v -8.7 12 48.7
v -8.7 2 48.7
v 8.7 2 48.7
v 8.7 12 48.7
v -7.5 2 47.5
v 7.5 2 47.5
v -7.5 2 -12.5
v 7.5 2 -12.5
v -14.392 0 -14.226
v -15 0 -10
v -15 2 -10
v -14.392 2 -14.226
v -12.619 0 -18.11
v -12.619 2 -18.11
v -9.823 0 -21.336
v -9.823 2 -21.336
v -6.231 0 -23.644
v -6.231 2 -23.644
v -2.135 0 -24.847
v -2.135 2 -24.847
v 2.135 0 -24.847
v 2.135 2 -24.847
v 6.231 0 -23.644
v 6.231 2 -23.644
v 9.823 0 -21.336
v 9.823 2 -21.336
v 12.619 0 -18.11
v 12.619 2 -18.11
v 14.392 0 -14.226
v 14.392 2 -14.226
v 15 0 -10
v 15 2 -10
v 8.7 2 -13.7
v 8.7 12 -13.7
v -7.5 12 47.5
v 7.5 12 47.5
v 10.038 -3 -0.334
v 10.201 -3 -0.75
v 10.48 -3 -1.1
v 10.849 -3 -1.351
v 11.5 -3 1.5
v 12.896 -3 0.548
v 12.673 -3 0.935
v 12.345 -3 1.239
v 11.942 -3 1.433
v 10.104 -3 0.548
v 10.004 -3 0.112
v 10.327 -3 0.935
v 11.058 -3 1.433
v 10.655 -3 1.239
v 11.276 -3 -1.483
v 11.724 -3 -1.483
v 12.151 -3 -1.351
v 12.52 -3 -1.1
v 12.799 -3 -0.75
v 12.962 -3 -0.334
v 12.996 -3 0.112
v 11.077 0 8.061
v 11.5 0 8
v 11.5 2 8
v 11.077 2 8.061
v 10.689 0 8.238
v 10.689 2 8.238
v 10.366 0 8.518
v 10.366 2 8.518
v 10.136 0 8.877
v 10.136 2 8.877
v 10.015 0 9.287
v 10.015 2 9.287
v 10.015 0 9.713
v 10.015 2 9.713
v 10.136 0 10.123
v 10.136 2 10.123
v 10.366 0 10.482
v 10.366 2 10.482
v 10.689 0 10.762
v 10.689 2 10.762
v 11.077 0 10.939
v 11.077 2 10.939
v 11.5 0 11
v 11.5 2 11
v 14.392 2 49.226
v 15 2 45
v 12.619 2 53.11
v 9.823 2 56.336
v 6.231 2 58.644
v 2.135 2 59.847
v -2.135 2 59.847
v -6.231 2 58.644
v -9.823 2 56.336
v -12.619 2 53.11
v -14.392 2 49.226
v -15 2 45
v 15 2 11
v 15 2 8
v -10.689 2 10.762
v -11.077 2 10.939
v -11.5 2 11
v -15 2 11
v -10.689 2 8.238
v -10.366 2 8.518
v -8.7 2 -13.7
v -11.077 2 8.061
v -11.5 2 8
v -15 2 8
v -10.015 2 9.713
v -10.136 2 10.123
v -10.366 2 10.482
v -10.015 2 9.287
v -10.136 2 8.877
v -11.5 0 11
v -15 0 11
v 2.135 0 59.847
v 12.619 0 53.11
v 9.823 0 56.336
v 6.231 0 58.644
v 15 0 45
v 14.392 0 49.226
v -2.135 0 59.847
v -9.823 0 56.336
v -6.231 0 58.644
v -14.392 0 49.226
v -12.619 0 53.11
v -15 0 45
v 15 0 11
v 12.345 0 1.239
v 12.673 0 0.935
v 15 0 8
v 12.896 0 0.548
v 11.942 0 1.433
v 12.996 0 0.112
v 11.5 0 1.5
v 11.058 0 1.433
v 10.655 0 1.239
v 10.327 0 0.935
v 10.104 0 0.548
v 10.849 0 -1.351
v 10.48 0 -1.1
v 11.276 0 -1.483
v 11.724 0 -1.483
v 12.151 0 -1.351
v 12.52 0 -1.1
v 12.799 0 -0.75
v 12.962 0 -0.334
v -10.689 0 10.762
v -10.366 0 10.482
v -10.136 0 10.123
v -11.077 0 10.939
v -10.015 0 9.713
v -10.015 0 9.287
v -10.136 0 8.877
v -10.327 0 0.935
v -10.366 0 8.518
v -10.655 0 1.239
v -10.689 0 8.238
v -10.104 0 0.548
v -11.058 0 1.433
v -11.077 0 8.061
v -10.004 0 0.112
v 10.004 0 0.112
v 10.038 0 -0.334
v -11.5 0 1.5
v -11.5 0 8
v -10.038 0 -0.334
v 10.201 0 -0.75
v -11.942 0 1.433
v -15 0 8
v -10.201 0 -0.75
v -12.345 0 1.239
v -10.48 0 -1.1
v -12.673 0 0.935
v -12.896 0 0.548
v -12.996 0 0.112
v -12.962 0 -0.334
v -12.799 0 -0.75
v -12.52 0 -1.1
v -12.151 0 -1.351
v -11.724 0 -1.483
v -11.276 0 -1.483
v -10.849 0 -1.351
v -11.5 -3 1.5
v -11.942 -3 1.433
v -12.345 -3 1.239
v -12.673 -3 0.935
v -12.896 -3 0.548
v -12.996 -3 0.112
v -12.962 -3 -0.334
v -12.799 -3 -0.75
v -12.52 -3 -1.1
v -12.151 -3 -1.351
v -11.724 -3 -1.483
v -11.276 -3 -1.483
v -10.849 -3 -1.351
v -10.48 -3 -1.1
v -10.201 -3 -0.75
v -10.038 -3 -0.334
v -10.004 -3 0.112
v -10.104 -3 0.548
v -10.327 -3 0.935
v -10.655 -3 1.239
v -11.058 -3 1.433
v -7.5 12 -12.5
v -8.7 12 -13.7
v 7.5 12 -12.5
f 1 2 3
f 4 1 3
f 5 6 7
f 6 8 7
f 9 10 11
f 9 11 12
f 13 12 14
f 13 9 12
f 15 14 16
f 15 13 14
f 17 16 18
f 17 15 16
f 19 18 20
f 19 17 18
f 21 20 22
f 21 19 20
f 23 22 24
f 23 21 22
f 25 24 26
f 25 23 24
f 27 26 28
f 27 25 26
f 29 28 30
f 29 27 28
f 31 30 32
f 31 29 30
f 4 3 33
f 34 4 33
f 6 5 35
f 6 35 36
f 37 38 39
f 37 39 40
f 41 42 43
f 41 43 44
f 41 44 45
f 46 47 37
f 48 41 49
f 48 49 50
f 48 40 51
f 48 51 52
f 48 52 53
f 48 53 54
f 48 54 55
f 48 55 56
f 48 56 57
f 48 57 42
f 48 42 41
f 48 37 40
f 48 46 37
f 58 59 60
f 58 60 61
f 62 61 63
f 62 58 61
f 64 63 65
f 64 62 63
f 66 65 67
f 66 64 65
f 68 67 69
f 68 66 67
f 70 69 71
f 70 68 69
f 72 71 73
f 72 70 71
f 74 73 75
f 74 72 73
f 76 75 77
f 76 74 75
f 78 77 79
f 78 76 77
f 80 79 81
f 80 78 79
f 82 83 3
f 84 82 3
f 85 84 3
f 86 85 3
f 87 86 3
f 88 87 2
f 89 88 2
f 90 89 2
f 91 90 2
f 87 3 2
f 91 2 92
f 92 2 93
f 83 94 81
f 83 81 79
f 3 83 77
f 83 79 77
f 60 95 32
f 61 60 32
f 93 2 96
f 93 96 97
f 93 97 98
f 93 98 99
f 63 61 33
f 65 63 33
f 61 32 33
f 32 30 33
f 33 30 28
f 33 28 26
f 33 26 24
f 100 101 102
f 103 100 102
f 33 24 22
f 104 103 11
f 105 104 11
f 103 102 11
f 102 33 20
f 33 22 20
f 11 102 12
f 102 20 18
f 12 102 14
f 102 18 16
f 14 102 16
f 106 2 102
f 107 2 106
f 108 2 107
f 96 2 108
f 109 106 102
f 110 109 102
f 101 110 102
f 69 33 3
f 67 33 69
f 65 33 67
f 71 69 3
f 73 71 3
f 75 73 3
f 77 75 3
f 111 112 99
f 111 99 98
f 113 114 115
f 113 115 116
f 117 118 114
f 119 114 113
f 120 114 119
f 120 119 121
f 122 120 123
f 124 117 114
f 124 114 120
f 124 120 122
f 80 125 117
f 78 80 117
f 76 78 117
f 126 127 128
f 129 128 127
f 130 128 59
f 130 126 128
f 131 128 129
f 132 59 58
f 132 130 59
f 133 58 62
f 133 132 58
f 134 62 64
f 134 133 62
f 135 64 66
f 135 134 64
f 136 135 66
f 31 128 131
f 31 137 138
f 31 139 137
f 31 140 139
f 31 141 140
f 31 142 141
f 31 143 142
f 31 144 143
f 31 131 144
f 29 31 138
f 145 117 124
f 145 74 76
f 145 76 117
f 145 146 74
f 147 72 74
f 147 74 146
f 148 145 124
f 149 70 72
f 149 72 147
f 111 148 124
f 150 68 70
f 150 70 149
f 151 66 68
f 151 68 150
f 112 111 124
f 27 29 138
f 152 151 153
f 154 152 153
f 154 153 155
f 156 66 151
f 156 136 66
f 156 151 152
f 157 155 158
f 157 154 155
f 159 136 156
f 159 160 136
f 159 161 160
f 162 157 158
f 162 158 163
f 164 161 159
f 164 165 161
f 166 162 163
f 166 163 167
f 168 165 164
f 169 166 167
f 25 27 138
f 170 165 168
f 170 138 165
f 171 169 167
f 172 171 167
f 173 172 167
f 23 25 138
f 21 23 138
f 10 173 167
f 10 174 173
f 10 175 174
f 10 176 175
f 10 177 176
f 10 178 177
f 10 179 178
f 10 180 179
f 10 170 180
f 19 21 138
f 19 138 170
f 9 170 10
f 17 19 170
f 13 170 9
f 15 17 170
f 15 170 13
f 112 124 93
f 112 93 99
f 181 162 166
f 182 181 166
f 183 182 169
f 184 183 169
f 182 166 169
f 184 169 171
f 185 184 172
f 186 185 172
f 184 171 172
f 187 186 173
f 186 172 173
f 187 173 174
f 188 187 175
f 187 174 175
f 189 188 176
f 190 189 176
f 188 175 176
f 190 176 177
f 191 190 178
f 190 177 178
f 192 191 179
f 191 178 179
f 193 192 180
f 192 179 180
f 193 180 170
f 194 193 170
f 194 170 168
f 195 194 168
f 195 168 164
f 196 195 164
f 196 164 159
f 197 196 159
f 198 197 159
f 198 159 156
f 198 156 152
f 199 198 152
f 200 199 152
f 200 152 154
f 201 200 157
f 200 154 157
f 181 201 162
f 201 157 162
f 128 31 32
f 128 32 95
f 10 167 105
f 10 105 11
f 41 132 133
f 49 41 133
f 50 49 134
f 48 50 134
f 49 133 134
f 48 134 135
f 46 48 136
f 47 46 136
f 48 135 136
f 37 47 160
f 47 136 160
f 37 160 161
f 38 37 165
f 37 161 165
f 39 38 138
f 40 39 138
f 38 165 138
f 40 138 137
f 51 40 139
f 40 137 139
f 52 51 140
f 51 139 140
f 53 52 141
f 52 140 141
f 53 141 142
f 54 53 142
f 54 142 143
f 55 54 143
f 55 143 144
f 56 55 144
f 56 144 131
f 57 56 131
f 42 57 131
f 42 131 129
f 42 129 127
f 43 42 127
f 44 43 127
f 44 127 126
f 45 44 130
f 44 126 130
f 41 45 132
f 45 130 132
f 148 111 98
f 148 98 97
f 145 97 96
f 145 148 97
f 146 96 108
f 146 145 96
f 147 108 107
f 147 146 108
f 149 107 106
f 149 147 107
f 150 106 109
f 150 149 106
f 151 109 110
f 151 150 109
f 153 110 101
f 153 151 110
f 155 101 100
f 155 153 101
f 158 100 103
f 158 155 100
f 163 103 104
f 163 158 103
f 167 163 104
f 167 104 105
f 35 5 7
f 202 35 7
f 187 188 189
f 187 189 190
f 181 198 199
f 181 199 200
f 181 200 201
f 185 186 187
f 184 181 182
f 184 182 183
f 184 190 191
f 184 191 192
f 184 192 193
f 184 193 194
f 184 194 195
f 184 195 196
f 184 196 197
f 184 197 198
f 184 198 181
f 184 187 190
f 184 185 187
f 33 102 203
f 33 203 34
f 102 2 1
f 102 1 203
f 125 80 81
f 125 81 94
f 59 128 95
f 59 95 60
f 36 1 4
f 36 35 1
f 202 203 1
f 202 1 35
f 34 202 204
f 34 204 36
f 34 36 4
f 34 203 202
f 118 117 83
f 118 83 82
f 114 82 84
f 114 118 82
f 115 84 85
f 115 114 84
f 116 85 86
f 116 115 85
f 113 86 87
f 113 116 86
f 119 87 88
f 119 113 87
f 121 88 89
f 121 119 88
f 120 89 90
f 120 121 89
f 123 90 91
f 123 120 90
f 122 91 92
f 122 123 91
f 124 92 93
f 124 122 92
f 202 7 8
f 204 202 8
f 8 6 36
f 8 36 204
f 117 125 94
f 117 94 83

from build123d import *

# Parameters (mm, degrees)
PLATE_EXTRUDE_DEPTH = 2
PEG_SKETCH_R        = 1.5
PEG_EXTRUDE_DEPTH   = 3
SKETCH3_W           = 17.4
SKETCH3_H           = 62.4
SKETCH3_W_2         = 15
SKETCH3_H_2         = 60
BOSS_EXTRUDE3_DEPTH = 10


with BuildPart() as part:
    # Plate Sketch → Plate Extrude (new body)
    with BuildSketch(Plane(origin=(0, 0, 0), x_dir=(1, 0, 0), z_dir=(0, 1, 0))):
        with BuildLine():
            Line((15, 10), (15, -8))
            Line((15, -8), (11.5, -8))
            ThreePointArc((11.5, -8), (10, -9.5), (11.5, -11))
            Line((11.5, -11), (15, -11))
            Line((15, -11), (15, -45))
            ThreePointArc((15, -45), (0, -60), (-15, -45))
            Line((-15, -45), (-15, -11))
            Line((-15, -11), (-11.5, -11))
            ThreePointArc((-11.5, -11), (-10, -9.5), (-11.5, -8))
            Line((-11.5, -8), (-15, -8))
            Line((-15, -8), (-15, 10))
            ThreePointArc((-15, 10), (0, 25), (15, 10))
        make_face()
    extrude(amount=PLATE_EXTRUDE_DEPTH)

    # Peg Sketch → Peg Extrude (add)
    with BuildSketch(Plane.XZ):
        with Locations(Location((11.5, 0, 0), (0, 0, 90))):
            Circle(PEG_SKETCH_R)
        with Locations(Location((-11.5, 0, 0), (0, 0, 90))):
            Circle(PEG_SKETCH_R)
    extrude(amount=PEG_EXTRUDE_DEPTH)

    # Sketch3 → Boss-Extrude3 (add)
    with BuildSketch(Plane(origin=(0, 2, 0), x_dir=(1, 0, 0), z_dir=(0, 1, 0))):
        with Locations((0, -17.5)):
            Rectangle(SKETCH3_W, SKETCH3_H)
        with Locations((0, -17.5)):
            Rectangle(SKETCH3_W_2, SKETCH3_H_2, mode=Mode.SUBTRACT)
    extrude(amount=BOSS_EXTRUDE3_DEPTH)


solid = part.part
